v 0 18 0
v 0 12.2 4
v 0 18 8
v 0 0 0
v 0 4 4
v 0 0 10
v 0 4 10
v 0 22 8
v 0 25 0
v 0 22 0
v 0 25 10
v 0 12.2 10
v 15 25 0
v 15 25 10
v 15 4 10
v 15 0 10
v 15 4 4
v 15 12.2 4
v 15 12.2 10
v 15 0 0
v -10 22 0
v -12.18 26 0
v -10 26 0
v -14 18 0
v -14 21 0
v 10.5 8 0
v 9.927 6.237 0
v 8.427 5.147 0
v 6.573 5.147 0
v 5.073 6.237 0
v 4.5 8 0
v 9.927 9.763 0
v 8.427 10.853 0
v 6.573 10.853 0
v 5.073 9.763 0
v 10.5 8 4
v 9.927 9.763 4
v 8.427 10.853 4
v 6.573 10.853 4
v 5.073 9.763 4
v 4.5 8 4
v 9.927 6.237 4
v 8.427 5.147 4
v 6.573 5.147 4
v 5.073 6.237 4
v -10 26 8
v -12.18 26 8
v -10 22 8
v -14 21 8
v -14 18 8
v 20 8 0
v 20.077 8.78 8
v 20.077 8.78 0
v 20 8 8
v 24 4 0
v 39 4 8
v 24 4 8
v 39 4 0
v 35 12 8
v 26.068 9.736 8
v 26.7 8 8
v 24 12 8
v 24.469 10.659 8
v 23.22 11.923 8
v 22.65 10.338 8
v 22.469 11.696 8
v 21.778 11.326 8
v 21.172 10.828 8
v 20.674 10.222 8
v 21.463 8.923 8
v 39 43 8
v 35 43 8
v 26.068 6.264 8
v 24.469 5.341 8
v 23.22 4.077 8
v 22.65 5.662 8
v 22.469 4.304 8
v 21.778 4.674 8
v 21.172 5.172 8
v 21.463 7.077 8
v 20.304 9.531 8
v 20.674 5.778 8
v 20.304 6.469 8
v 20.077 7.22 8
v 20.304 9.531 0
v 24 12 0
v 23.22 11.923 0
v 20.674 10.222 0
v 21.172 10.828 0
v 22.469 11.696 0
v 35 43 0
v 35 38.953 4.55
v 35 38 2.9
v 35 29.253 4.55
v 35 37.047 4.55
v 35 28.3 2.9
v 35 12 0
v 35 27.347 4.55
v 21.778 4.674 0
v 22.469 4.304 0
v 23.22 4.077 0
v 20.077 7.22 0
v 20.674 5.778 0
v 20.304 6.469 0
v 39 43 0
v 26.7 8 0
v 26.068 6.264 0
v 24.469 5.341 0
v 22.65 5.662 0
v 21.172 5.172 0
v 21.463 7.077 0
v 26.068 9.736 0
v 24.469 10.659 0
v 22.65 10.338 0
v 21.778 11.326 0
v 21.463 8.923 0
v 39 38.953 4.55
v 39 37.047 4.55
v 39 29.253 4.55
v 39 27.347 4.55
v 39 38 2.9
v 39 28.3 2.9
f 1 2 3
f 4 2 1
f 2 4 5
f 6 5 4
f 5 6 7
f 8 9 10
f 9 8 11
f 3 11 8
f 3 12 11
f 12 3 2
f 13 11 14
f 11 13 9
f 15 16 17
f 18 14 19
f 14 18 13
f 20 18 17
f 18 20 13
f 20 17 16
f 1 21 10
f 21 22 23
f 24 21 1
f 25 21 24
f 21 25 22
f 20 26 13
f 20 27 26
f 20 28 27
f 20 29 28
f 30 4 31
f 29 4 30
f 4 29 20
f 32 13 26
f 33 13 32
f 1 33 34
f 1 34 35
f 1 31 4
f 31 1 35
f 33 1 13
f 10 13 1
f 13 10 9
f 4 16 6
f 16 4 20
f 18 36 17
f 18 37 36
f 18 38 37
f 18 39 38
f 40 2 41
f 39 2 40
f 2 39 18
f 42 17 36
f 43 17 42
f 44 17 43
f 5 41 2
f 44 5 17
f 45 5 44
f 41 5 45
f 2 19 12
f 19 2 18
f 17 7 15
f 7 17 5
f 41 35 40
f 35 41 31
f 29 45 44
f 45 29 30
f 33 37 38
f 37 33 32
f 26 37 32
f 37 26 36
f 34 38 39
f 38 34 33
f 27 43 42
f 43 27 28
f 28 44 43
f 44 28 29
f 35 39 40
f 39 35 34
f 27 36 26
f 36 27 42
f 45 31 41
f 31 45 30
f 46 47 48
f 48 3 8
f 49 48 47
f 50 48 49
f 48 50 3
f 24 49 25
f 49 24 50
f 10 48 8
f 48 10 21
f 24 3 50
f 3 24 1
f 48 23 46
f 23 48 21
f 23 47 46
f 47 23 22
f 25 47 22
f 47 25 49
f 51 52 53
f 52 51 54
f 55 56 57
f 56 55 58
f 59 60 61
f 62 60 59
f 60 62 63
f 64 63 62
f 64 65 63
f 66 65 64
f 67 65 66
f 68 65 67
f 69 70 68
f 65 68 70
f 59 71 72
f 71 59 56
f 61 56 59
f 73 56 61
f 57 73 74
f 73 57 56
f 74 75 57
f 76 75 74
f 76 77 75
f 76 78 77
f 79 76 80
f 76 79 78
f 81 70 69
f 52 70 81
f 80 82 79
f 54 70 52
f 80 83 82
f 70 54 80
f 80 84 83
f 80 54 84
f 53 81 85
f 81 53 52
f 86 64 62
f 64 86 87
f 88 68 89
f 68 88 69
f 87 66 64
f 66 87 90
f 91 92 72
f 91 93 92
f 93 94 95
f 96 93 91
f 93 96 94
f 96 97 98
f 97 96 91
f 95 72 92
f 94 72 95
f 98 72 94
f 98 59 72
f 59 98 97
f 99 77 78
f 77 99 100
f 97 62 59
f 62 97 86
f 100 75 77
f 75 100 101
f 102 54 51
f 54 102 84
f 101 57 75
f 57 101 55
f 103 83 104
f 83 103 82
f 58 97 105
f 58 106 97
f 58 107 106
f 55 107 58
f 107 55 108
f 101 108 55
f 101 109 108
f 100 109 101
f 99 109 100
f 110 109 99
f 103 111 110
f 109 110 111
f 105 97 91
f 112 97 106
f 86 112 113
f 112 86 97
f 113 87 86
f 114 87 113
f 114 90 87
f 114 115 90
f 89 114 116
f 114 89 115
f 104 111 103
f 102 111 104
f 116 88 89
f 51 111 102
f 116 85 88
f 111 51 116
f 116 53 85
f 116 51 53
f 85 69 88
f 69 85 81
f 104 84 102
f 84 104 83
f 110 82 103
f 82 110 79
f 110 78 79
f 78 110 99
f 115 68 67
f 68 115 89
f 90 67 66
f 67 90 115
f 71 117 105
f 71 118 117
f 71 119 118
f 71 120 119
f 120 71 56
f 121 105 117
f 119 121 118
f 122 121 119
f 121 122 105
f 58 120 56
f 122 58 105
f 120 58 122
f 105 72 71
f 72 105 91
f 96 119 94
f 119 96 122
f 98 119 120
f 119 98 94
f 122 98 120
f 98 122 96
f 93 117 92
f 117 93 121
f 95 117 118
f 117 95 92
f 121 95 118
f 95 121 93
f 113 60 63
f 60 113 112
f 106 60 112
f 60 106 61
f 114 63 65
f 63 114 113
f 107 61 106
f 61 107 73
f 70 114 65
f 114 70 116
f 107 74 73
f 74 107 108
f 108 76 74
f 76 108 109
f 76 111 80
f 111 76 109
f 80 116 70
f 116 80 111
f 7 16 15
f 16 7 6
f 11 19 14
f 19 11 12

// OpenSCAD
// heavily inspired by http://www.thingiverse.com/thing:16380/


module UpperLeftWall() {
  hull() for(p=[[0,0],[0,100],[100,0],[100,100]])
    translate([p[0],0,p[1]])
    rotate([90,0,0]) cylinder(r=2.5,h=6,$fn=32);
}

module InverseUpperLeftWall() {
  difference() {
    translate([-10,-4,0]) cube([200,5,200]);
    UpperLeftWall();
  }
}
    

module Stationary(screw_rad=3, wide=15, wall_thick=4, adjuster_wide=8, clearance=0.2, tall=55) {
  difference(){
    cube([wide,25,tall]);
    translate([-1,wall_thick,wall_thick])
      cube([wide+2,adjuster_wide+clearance, 30]);
    translate([wide/2, wall_thick+adjuster_wide/2, -1]) cylinder(r=screw_rad,h=100);
    translate([2.5,25,-100+tall-2.5]) InverseUpperLeftWall();
    // mounting screw
    translate([2.5,-1,tall-2.5]) rotate([-90,0,0]) cylinder(r=3.3/2,h=100);
  }
  // 3 is maybe 3.3
  difference() {
    union() {
      translate([-10-wall_thick,25-wall_thick-3,0])
        cube([10+wall_thick+1,wall_thick,8]);
      translate([-10-wall_thick,25-wall_thick,0])
        cube([wall_thick,wall_thick+1,8]);
    }
    translate([-10-wall_thick,25-wall_thick,-1])
      rotate([0,0,70])
        cube([20,20,20]);
  }
}


module Adjuster(screw_rad=2.7, stationary_wide=15, adjuster_wide=8, tall=8) {
  difference() {
    union() {
      // part the screw taps in
      hull() {
        translate([adjuster_wide/2,0,0])
          cylinder(r=adjuster_wide/2, h=tall, $fn=32);
        translate([stationary_wide-1, -adjuster_wide/2, 0])
          cube([1, adjuster_wide, tall]);
      }
      // arm
      translate([stationary_wide,-adjuster_wide/2,0]) cube([4,39,tall]);
    }

    translate([adjuster_wide/2,0,-1]) cylinder(r=screw_rad,h=100);
    // microswitch holes
    for(o=[30-9.7,30])
      translate([0,o,tall/2])
        rotate([0,90,0])
          cylinder(r=1.1,h=100,$fn=3);
  }
}

intersection() {
  union() {
    Stationary();
    translate([20,8,0]) Adjuster();
  }
  translate([-50,-1,-1])
    cube([100,100,11]);
}
